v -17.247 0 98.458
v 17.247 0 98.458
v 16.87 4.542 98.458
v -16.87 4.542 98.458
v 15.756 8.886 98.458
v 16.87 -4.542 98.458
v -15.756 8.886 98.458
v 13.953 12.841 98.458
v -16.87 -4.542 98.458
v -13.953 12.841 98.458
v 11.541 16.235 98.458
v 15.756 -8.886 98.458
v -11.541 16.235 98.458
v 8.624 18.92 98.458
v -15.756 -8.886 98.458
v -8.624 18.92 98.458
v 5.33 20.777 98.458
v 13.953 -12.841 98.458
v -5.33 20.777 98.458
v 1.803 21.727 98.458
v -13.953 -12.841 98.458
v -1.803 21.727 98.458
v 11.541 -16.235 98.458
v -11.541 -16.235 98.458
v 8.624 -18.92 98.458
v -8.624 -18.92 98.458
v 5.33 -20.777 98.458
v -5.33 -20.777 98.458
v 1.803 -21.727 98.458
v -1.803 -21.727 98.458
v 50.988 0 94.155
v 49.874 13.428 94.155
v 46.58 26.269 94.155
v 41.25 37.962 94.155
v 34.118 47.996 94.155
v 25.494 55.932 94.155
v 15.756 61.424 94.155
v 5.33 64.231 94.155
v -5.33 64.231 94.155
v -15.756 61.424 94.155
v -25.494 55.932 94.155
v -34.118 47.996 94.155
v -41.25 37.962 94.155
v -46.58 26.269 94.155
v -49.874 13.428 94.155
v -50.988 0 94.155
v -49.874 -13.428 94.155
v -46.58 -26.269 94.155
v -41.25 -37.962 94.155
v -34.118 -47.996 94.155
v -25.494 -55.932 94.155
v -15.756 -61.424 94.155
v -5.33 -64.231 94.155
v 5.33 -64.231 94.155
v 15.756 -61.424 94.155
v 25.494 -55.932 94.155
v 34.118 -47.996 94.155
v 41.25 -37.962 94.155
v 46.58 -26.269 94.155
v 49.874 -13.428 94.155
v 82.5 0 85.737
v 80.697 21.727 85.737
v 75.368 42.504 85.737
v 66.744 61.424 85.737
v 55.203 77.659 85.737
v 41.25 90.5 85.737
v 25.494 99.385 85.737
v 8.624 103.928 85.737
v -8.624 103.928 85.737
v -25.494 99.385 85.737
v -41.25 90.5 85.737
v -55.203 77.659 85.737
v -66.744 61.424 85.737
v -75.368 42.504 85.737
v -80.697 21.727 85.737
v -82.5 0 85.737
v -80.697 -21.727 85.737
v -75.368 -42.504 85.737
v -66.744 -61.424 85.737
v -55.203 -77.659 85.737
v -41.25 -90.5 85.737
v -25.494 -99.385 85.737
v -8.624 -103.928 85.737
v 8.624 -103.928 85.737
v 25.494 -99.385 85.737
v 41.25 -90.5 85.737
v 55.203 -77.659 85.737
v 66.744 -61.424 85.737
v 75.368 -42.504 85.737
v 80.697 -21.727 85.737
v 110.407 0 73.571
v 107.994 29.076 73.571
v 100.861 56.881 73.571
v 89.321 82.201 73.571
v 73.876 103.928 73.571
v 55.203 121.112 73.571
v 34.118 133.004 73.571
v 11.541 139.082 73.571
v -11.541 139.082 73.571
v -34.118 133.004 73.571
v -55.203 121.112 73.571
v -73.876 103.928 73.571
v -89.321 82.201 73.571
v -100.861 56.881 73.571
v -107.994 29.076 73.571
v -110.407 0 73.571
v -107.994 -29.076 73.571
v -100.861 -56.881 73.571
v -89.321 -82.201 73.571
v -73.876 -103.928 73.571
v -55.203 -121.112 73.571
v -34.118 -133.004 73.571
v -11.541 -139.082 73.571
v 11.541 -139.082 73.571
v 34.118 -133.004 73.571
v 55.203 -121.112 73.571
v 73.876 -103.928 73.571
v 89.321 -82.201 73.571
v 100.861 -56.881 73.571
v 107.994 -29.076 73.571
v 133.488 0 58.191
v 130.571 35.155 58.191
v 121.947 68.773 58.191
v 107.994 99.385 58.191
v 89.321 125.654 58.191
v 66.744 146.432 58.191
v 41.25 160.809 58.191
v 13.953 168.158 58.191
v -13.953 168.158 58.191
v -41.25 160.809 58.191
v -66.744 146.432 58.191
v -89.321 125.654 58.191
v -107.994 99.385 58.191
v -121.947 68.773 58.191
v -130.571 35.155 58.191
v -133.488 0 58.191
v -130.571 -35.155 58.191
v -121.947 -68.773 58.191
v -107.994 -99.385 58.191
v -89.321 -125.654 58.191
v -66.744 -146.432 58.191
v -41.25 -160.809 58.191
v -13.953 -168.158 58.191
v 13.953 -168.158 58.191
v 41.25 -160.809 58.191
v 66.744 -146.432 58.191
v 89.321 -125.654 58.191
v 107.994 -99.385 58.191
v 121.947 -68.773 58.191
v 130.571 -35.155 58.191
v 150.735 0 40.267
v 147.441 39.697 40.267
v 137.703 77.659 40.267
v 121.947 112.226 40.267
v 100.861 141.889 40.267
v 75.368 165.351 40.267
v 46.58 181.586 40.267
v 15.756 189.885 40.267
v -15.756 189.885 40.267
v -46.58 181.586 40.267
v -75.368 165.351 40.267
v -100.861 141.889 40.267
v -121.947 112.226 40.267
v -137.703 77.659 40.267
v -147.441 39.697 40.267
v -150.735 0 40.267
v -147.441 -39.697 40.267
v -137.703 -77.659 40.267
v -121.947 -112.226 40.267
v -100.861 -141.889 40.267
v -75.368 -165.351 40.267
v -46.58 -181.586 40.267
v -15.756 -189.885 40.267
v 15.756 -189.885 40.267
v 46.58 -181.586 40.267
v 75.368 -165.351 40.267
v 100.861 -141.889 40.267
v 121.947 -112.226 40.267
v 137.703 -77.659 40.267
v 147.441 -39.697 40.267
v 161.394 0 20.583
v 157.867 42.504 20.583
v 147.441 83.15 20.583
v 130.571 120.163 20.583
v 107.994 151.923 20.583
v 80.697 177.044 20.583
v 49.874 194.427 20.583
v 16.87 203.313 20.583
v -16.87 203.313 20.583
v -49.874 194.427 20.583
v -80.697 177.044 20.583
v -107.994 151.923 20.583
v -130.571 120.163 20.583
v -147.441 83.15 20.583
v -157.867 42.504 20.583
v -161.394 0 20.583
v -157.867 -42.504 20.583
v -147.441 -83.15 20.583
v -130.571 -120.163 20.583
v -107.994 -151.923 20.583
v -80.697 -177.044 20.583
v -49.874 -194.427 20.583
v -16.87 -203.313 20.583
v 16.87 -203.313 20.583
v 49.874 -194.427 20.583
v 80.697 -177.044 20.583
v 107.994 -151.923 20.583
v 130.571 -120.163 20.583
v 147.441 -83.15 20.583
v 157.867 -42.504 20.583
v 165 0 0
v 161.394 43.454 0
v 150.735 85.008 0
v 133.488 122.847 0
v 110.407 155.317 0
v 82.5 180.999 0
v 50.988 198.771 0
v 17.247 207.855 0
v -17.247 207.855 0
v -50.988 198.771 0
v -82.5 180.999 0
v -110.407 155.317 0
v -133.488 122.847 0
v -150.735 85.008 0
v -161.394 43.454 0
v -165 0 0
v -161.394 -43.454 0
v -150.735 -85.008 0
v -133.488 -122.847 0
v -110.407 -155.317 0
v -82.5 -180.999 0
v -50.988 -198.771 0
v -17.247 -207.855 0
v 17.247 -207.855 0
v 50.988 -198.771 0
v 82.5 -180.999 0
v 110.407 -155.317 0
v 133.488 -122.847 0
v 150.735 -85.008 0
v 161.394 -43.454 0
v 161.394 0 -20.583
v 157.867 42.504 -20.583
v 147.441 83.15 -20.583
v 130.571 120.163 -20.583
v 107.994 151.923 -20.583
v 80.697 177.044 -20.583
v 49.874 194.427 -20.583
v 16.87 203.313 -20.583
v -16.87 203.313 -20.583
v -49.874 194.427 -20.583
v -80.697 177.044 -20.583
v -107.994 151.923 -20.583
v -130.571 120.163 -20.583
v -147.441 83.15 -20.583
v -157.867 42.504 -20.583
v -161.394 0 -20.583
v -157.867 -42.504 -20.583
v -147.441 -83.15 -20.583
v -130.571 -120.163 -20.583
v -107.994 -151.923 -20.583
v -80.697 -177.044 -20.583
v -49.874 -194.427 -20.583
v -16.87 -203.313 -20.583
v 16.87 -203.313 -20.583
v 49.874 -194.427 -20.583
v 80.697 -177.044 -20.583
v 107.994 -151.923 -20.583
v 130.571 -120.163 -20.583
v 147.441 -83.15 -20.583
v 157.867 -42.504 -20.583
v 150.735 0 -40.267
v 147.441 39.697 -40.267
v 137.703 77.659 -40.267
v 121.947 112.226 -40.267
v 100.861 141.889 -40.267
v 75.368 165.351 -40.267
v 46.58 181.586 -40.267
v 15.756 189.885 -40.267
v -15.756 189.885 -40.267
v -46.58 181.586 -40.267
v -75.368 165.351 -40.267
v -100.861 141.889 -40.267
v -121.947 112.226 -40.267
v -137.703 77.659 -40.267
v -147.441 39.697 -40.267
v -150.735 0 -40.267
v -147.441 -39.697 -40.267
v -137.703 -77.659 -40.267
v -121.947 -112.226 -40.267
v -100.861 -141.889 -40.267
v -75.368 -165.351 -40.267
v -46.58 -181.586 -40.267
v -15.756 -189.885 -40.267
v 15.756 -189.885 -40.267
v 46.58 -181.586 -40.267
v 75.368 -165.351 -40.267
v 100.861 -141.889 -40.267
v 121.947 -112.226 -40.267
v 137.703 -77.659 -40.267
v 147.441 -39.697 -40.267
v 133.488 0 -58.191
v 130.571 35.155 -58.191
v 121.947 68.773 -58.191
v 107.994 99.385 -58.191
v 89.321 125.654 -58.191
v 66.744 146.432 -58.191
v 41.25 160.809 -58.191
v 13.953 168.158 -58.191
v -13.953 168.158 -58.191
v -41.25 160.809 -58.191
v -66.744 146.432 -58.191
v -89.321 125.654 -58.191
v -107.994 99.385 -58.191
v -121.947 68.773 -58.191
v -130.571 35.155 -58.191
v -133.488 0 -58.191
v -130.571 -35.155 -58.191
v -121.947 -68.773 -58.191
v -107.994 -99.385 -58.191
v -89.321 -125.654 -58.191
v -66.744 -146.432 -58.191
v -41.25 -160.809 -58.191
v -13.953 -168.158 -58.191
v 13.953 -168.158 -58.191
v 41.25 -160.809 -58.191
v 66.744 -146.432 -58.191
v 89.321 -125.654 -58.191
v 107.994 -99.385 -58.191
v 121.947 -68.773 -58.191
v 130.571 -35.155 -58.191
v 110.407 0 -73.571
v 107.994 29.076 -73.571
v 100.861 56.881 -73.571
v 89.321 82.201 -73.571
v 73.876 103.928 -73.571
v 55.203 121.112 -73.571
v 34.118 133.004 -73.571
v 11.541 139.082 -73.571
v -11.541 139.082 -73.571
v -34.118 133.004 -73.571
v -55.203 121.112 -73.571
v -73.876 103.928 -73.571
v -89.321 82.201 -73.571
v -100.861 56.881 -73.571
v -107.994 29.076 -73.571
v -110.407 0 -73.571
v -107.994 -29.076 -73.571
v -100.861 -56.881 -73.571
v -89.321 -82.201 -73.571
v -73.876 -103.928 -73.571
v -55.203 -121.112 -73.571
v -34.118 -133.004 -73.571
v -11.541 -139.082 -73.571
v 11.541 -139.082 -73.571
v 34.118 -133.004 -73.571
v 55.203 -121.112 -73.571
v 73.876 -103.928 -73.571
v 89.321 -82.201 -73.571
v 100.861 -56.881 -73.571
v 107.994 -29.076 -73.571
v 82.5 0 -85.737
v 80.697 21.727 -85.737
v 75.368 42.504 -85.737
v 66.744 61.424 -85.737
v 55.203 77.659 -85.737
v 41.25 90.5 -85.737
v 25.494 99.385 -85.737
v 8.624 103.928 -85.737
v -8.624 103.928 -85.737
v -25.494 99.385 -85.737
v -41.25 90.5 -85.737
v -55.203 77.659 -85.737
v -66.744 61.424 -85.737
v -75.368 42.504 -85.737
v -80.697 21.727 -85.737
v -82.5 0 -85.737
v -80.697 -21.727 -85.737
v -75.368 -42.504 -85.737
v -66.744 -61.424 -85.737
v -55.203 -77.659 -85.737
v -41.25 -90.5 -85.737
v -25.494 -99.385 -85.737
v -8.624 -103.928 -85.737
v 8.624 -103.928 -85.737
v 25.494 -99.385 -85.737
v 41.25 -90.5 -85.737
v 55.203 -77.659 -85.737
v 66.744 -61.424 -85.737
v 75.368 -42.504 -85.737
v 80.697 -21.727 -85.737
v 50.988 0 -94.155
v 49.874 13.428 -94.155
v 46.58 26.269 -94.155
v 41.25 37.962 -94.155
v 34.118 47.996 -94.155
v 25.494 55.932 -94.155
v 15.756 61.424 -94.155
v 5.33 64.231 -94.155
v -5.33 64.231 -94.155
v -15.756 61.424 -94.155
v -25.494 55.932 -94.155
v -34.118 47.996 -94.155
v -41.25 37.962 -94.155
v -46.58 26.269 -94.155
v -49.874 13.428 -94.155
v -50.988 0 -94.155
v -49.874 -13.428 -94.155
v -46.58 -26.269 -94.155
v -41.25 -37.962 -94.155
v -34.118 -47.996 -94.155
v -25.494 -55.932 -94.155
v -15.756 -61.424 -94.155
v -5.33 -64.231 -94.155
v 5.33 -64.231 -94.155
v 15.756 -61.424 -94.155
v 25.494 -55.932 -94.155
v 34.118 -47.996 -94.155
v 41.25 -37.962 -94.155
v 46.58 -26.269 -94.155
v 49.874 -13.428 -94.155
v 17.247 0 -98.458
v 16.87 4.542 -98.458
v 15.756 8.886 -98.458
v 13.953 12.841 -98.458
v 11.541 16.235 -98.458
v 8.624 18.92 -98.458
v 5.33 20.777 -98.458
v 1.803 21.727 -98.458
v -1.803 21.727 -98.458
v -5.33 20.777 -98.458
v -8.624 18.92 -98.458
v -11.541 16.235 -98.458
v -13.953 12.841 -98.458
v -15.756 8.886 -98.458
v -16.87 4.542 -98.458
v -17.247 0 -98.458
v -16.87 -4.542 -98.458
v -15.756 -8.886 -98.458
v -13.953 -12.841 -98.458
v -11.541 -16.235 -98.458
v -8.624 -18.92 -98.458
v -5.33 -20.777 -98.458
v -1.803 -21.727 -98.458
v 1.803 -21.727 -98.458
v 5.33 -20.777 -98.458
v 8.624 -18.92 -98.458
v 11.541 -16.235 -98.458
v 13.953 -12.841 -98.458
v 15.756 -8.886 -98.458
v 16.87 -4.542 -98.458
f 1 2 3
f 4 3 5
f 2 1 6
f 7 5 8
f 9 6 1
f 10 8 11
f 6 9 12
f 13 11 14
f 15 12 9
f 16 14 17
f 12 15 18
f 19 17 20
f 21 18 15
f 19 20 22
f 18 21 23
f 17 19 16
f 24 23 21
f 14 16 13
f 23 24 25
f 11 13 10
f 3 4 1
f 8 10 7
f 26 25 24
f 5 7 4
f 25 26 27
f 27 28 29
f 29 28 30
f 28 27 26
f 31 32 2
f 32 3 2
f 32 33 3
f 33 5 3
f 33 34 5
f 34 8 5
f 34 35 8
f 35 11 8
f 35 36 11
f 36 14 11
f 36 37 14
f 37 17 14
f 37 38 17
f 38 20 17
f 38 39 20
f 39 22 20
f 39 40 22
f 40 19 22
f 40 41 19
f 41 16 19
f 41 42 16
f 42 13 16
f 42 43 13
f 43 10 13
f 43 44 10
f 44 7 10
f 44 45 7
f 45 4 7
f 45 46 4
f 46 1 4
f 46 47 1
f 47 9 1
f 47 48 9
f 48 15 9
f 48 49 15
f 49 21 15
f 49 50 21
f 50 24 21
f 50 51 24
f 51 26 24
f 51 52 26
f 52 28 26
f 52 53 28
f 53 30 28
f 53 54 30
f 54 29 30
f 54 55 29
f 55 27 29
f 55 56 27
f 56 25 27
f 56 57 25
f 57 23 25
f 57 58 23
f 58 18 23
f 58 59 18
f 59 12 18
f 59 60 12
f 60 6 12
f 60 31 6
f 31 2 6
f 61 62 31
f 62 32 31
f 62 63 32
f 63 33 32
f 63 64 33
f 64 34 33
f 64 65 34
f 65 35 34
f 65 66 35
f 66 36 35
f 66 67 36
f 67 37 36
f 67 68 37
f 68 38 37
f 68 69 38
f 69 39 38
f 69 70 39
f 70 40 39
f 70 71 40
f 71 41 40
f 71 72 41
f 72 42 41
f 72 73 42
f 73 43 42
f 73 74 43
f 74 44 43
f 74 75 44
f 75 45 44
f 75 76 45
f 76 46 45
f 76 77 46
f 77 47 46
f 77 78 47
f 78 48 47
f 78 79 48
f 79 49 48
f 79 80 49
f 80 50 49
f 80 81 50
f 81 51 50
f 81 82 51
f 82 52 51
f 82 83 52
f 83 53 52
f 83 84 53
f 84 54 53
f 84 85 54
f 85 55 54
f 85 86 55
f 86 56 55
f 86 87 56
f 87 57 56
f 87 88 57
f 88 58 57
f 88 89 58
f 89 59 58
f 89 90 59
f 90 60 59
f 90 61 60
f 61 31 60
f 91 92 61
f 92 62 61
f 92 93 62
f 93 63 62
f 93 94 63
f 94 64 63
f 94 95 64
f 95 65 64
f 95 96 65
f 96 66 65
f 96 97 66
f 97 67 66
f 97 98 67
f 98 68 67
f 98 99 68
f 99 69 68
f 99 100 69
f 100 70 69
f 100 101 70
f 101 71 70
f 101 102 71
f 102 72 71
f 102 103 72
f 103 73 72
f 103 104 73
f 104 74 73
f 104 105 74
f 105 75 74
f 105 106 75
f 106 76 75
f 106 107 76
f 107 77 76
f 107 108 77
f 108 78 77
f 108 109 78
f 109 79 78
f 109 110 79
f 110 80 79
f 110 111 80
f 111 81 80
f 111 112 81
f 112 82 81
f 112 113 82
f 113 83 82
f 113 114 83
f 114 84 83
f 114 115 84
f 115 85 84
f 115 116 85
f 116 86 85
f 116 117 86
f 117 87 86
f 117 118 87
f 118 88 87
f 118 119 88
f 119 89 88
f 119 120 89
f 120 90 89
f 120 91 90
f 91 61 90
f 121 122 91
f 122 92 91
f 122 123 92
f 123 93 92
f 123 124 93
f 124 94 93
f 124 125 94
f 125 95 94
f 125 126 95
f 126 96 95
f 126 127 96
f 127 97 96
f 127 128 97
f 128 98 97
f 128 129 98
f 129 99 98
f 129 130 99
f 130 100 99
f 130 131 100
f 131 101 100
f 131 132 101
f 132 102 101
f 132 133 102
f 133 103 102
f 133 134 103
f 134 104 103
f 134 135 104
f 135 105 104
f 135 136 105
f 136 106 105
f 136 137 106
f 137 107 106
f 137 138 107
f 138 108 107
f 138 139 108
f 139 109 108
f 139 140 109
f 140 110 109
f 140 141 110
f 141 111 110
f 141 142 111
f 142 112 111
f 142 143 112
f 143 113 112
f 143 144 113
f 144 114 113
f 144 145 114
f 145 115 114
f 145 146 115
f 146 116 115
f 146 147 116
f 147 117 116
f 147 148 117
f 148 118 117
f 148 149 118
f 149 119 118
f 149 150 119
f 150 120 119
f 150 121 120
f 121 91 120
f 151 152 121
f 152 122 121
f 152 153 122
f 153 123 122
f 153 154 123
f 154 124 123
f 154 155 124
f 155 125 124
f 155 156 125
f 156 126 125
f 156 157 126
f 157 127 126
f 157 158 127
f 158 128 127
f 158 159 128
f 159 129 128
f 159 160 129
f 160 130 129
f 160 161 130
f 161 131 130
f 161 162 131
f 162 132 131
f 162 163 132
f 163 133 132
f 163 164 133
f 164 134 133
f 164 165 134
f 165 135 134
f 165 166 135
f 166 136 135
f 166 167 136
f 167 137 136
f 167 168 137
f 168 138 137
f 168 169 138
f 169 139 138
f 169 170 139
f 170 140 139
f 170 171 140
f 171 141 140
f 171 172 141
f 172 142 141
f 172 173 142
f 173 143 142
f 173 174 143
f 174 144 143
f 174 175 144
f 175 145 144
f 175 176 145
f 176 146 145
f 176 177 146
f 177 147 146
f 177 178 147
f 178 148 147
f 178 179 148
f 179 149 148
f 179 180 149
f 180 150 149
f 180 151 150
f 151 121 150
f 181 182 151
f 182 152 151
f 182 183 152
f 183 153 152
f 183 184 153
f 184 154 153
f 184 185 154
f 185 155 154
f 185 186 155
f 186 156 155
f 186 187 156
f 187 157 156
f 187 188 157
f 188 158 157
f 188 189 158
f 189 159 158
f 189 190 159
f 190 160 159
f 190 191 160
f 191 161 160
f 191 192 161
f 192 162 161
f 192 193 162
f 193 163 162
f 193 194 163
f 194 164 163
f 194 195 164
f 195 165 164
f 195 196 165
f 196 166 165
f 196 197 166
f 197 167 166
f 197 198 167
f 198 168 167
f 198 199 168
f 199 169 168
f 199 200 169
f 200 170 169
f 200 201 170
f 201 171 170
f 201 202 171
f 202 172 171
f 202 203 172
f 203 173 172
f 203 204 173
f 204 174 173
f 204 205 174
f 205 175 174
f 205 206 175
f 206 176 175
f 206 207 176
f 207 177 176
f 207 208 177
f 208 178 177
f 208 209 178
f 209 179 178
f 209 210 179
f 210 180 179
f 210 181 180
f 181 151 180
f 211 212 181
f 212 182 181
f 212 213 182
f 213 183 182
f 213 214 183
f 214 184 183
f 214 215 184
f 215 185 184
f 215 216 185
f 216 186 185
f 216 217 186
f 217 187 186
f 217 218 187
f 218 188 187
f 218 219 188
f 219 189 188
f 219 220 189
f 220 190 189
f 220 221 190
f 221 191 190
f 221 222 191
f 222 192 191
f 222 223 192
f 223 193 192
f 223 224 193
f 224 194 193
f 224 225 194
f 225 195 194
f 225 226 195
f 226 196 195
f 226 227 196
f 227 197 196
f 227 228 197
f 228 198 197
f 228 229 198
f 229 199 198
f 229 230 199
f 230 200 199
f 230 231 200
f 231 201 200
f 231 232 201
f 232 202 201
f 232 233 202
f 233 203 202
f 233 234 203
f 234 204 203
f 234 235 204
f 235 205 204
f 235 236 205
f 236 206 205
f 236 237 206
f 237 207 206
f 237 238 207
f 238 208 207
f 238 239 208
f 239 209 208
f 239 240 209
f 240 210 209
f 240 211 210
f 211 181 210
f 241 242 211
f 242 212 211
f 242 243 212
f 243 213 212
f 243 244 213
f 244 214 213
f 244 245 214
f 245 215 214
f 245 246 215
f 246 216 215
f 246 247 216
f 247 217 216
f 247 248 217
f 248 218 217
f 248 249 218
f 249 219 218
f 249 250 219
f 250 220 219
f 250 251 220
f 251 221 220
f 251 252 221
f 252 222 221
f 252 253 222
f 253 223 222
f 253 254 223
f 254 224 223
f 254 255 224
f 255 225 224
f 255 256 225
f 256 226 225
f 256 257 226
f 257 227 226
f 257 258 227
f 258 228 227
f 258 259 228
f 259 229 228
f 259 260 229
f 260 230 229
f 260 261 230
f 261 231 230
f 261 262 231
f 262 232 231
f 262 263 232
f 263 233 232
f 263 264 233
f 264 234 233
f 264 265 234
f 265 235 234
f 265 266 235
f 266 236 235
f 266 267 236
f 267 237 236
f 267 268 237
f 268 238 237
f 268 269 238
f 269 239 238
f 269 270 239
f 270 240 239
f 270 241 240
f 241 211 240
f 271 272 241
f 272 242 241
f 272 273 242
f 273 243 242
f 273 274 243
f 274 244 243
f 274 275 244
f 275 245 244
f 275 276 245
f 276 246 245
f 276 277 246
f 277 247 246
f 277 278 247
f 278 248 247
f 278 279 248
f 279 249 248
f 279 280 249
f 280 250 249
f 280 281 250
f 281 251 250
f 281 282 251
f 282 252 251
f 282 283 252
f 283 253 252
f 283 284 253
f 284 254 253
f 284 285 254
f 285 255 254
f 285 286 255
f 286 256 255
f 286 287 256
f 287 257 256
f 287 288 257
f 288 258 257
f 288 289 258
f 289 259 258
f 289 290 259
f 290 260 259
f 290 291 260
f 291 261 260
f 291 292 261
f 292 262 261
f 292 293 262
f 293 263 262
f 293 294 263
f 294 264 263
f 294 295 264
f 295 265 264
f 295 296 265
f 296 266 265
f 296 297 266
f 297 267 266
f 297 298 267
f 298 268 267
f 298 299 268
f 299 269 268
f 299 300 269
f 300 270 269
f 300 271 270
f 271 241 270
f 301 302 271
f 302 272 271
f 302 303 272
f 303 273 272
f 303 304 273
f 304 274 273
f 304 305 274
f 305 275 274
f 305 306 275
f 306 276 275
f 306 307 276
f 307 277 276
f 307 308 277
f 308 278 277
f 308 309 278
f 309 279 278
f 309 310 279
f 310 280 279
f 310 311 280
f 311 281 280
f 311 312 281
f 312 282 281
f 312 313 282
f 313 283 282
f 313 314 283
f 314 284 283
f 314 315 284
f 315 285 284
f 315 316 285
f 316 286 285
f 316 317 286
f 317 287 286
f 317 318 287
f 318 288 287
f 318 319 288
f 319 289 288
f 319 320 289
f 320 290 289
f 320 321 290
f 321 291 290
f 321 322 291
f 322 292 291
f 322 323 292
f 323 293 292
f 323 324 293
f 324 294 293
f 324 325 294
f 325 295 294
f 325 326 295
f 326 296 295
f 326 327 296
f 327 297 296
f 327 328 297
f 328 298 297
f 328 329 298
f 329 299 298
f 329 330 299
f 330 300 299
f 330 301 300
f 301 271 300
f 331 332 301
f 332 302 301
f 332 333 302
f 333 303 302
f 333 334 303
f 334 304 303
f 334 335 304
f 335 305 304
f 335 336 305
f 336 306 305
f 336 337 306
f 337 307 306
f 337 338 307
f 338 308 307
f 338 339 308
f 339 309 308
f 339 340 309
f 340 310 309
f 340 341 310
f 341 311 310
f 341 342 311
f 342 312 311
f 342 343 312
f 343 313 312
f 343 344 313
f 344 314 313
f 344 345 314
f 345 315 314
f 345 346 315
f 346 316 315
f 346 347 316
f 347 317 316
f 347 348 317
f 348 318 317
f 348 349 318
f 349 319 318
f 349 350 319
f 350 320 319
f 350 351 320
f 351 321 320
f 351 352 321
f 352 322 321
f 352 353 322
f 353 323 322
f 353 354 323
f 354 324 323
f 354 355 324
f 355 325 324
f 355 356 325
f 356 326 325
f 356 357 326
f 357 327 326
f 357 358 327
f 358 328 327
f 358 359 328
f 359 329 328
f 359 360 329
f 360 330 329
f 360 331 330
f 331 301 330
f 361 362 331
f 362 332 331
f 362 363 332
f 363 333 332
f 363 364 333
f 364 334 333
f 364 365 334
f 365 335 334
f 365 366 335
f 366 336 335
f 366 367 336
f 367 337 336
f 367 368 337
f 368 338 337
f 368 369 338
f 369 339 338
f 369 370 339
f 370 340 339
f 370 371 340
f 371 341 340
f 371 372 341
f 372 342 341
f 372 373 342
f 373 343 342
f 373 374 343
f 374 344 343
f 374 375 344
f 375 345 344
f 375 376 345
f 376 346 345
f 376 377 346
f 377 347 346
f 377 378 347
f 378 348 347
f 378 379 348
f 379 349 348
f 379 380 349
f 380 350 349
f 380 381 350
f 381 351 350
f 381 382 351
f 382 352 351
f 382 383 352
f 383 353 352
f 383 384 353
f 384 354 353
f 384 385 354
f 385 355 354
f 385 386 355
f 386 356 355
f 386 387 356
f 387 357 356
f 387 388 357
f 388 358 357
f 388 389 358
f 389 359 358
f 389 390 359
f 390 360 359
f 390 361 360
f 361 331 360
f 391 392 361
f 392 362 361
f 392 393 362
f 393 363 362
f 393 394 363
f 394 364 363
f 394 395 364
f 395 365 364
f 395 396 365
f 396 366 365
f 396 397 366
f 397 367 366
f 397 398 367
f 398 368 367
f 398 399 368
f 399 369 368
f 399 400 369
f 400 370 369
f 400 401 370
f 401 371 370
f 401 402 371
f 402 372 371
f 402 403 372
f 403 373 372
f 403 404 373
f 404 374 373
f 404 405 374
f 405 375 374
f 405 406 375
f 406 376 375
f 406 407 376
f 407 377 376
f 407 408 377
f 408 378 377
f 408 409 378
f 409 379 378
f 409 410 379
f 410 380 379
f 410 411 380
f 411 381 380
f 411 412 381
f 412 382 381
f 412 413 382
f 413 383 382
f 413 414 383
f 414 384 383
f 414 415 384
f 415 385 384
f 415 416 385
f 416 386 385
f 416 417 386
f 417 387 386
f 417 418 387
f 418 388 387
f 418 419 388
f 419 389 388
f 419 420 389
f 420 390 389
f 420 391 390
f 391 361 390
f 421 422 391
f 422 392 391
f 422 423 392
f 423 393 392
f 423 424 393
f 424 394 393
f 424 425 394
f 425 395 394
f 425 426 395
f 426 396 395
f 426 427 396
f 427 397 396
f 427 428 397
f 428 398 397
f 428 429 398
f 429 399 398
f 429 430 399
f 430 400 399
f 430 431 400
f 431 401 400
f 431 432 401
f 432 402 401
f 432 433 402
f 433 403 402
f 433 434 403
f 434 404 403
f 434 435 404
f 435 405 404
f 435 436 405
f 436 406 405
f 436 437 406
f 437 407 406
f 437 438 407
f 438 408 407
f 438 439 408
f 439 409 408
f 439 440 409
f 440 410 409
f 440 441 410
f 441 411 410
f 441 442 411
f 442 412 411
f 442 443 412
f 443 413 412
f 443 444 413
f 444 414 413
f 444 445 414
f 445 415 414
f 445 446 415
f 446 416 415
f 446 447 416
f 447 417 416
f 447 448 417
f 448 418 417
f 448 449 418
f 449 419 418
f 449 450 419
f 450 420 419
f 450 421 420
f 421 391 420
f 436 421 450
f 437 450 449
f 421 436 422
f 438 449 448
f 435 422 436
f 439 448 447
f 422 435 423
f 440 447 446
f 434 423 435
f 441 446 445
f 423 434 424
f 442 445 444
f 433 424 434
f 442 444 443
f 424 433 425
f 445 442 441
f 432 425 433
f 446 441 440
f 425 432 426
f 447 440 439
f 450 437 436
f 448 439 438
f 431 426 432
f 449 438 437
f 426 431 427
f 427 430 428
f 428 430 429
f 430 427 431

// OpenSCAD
// Generated by SolidPython 1.0.1 on 2020-07-29 00:46:52


scale(v = [15, 19, 9]) {
	sphere(r = 11);
}
/***********************************************
*********      SolidPython code:      **********
************************************************
 
# import packages: SolidPython
from solid import *
from solid.utils import *
from itertools import chain, combinations, permutations


class Resize:

    def __init__(self, scad_file):
        self.scad_file = scad_file
        #self.scad_file = import_scad(scad_file)
        # cone/cylinder param:
        self.r1 = 0
        self.r2 = 0
        self.h = 0
        # rectangular prism param:
        self.w = 0
        self.l = 0
        # ellipse param:
        self.r = 0

    # import OpenScad code (file name corresponds to shape)


    # classify shape + parameters
    def assign(self, param1, param2, param3):
        if self.scad_file == 'cone.scad':
            self.r1 = param1
            self.r2 = param2
            self.h = param3
        elif self.scad_file == 'cylinder.scad':
            self.r1 = param1
            self.r2 = param2
            self.h = param3
        elif self.scad_file == 'rectangularPrism.scad':
            self.h = param1
            self.l = param2
            self.w = param3
        else:
            self.r = param1
            self.h = param2

    # resize parameters
    def iterate(self):
        x = range(3, 20, 2)
        i = 1
        if self.scad_file == 'cone.scad':
            tempList = list(permutations(x, 2))
            for temp in tempList:
                param1 = temp[0]
                param2 = temp[1]
                filepath = 'produced_scad_files/' + 'cone' + str(param1) + '_' + str(param2) + '_' + '.scad'
                scad_render_to_file(cylinder(h=param1, r1=param2, r2=0), filepath)

        elif self.scad_file == 'cylinder.scad':
            tempList = list(permutations(x, 3))
            for temp in tempList:
                param1 = temp[0]
                param2 = temp[1]
                filepath = 'produced_scad_files/' + 'cylinder' + str(param1) + '_' + str(param2) + '_' + '.scad'
                scad_render_to_file(cylinder(h=param1, r1=param2, r2=param2), filepath)

        elif self.scad_file == 'rectangularPrism.scad':
            tempList = list(permutations(x, 3))
            for temp in tempList:
                param1 = temp[0]
                param2 = temp[1]
                param3 = temp[2]
                filepath = 'produced_scad_files/' + 'rectangularPrism' + str(param1) + '_' + str(param2) + '_' + str(
                    param3) + '.scad'
                scad_render_to_file(cube(size=(param1, param2, param3)), filepath)

        elif self.scad_file == 'ellipse.scad':
            tempList = list(permutations(x, 4))
            for temp in tempList:
                param1 = temp[0]
                param2 = temp[1]
                param3 = temp[2]
                param4 = temp[3]
                filepath = 'produced_scad_files/' + 'ellipse' + str(param1) + '_' + str(param2) + '_' + str(param3) + '_' + str(param4) + '.scad'
                scad_render_to_file(scale([param1, param2, param3])(sphere(r=param4)), filepath)

    def render_to_scadfile(self):
        scad_render_to_file(scad, 'example.scad') 
 
************************************************/
